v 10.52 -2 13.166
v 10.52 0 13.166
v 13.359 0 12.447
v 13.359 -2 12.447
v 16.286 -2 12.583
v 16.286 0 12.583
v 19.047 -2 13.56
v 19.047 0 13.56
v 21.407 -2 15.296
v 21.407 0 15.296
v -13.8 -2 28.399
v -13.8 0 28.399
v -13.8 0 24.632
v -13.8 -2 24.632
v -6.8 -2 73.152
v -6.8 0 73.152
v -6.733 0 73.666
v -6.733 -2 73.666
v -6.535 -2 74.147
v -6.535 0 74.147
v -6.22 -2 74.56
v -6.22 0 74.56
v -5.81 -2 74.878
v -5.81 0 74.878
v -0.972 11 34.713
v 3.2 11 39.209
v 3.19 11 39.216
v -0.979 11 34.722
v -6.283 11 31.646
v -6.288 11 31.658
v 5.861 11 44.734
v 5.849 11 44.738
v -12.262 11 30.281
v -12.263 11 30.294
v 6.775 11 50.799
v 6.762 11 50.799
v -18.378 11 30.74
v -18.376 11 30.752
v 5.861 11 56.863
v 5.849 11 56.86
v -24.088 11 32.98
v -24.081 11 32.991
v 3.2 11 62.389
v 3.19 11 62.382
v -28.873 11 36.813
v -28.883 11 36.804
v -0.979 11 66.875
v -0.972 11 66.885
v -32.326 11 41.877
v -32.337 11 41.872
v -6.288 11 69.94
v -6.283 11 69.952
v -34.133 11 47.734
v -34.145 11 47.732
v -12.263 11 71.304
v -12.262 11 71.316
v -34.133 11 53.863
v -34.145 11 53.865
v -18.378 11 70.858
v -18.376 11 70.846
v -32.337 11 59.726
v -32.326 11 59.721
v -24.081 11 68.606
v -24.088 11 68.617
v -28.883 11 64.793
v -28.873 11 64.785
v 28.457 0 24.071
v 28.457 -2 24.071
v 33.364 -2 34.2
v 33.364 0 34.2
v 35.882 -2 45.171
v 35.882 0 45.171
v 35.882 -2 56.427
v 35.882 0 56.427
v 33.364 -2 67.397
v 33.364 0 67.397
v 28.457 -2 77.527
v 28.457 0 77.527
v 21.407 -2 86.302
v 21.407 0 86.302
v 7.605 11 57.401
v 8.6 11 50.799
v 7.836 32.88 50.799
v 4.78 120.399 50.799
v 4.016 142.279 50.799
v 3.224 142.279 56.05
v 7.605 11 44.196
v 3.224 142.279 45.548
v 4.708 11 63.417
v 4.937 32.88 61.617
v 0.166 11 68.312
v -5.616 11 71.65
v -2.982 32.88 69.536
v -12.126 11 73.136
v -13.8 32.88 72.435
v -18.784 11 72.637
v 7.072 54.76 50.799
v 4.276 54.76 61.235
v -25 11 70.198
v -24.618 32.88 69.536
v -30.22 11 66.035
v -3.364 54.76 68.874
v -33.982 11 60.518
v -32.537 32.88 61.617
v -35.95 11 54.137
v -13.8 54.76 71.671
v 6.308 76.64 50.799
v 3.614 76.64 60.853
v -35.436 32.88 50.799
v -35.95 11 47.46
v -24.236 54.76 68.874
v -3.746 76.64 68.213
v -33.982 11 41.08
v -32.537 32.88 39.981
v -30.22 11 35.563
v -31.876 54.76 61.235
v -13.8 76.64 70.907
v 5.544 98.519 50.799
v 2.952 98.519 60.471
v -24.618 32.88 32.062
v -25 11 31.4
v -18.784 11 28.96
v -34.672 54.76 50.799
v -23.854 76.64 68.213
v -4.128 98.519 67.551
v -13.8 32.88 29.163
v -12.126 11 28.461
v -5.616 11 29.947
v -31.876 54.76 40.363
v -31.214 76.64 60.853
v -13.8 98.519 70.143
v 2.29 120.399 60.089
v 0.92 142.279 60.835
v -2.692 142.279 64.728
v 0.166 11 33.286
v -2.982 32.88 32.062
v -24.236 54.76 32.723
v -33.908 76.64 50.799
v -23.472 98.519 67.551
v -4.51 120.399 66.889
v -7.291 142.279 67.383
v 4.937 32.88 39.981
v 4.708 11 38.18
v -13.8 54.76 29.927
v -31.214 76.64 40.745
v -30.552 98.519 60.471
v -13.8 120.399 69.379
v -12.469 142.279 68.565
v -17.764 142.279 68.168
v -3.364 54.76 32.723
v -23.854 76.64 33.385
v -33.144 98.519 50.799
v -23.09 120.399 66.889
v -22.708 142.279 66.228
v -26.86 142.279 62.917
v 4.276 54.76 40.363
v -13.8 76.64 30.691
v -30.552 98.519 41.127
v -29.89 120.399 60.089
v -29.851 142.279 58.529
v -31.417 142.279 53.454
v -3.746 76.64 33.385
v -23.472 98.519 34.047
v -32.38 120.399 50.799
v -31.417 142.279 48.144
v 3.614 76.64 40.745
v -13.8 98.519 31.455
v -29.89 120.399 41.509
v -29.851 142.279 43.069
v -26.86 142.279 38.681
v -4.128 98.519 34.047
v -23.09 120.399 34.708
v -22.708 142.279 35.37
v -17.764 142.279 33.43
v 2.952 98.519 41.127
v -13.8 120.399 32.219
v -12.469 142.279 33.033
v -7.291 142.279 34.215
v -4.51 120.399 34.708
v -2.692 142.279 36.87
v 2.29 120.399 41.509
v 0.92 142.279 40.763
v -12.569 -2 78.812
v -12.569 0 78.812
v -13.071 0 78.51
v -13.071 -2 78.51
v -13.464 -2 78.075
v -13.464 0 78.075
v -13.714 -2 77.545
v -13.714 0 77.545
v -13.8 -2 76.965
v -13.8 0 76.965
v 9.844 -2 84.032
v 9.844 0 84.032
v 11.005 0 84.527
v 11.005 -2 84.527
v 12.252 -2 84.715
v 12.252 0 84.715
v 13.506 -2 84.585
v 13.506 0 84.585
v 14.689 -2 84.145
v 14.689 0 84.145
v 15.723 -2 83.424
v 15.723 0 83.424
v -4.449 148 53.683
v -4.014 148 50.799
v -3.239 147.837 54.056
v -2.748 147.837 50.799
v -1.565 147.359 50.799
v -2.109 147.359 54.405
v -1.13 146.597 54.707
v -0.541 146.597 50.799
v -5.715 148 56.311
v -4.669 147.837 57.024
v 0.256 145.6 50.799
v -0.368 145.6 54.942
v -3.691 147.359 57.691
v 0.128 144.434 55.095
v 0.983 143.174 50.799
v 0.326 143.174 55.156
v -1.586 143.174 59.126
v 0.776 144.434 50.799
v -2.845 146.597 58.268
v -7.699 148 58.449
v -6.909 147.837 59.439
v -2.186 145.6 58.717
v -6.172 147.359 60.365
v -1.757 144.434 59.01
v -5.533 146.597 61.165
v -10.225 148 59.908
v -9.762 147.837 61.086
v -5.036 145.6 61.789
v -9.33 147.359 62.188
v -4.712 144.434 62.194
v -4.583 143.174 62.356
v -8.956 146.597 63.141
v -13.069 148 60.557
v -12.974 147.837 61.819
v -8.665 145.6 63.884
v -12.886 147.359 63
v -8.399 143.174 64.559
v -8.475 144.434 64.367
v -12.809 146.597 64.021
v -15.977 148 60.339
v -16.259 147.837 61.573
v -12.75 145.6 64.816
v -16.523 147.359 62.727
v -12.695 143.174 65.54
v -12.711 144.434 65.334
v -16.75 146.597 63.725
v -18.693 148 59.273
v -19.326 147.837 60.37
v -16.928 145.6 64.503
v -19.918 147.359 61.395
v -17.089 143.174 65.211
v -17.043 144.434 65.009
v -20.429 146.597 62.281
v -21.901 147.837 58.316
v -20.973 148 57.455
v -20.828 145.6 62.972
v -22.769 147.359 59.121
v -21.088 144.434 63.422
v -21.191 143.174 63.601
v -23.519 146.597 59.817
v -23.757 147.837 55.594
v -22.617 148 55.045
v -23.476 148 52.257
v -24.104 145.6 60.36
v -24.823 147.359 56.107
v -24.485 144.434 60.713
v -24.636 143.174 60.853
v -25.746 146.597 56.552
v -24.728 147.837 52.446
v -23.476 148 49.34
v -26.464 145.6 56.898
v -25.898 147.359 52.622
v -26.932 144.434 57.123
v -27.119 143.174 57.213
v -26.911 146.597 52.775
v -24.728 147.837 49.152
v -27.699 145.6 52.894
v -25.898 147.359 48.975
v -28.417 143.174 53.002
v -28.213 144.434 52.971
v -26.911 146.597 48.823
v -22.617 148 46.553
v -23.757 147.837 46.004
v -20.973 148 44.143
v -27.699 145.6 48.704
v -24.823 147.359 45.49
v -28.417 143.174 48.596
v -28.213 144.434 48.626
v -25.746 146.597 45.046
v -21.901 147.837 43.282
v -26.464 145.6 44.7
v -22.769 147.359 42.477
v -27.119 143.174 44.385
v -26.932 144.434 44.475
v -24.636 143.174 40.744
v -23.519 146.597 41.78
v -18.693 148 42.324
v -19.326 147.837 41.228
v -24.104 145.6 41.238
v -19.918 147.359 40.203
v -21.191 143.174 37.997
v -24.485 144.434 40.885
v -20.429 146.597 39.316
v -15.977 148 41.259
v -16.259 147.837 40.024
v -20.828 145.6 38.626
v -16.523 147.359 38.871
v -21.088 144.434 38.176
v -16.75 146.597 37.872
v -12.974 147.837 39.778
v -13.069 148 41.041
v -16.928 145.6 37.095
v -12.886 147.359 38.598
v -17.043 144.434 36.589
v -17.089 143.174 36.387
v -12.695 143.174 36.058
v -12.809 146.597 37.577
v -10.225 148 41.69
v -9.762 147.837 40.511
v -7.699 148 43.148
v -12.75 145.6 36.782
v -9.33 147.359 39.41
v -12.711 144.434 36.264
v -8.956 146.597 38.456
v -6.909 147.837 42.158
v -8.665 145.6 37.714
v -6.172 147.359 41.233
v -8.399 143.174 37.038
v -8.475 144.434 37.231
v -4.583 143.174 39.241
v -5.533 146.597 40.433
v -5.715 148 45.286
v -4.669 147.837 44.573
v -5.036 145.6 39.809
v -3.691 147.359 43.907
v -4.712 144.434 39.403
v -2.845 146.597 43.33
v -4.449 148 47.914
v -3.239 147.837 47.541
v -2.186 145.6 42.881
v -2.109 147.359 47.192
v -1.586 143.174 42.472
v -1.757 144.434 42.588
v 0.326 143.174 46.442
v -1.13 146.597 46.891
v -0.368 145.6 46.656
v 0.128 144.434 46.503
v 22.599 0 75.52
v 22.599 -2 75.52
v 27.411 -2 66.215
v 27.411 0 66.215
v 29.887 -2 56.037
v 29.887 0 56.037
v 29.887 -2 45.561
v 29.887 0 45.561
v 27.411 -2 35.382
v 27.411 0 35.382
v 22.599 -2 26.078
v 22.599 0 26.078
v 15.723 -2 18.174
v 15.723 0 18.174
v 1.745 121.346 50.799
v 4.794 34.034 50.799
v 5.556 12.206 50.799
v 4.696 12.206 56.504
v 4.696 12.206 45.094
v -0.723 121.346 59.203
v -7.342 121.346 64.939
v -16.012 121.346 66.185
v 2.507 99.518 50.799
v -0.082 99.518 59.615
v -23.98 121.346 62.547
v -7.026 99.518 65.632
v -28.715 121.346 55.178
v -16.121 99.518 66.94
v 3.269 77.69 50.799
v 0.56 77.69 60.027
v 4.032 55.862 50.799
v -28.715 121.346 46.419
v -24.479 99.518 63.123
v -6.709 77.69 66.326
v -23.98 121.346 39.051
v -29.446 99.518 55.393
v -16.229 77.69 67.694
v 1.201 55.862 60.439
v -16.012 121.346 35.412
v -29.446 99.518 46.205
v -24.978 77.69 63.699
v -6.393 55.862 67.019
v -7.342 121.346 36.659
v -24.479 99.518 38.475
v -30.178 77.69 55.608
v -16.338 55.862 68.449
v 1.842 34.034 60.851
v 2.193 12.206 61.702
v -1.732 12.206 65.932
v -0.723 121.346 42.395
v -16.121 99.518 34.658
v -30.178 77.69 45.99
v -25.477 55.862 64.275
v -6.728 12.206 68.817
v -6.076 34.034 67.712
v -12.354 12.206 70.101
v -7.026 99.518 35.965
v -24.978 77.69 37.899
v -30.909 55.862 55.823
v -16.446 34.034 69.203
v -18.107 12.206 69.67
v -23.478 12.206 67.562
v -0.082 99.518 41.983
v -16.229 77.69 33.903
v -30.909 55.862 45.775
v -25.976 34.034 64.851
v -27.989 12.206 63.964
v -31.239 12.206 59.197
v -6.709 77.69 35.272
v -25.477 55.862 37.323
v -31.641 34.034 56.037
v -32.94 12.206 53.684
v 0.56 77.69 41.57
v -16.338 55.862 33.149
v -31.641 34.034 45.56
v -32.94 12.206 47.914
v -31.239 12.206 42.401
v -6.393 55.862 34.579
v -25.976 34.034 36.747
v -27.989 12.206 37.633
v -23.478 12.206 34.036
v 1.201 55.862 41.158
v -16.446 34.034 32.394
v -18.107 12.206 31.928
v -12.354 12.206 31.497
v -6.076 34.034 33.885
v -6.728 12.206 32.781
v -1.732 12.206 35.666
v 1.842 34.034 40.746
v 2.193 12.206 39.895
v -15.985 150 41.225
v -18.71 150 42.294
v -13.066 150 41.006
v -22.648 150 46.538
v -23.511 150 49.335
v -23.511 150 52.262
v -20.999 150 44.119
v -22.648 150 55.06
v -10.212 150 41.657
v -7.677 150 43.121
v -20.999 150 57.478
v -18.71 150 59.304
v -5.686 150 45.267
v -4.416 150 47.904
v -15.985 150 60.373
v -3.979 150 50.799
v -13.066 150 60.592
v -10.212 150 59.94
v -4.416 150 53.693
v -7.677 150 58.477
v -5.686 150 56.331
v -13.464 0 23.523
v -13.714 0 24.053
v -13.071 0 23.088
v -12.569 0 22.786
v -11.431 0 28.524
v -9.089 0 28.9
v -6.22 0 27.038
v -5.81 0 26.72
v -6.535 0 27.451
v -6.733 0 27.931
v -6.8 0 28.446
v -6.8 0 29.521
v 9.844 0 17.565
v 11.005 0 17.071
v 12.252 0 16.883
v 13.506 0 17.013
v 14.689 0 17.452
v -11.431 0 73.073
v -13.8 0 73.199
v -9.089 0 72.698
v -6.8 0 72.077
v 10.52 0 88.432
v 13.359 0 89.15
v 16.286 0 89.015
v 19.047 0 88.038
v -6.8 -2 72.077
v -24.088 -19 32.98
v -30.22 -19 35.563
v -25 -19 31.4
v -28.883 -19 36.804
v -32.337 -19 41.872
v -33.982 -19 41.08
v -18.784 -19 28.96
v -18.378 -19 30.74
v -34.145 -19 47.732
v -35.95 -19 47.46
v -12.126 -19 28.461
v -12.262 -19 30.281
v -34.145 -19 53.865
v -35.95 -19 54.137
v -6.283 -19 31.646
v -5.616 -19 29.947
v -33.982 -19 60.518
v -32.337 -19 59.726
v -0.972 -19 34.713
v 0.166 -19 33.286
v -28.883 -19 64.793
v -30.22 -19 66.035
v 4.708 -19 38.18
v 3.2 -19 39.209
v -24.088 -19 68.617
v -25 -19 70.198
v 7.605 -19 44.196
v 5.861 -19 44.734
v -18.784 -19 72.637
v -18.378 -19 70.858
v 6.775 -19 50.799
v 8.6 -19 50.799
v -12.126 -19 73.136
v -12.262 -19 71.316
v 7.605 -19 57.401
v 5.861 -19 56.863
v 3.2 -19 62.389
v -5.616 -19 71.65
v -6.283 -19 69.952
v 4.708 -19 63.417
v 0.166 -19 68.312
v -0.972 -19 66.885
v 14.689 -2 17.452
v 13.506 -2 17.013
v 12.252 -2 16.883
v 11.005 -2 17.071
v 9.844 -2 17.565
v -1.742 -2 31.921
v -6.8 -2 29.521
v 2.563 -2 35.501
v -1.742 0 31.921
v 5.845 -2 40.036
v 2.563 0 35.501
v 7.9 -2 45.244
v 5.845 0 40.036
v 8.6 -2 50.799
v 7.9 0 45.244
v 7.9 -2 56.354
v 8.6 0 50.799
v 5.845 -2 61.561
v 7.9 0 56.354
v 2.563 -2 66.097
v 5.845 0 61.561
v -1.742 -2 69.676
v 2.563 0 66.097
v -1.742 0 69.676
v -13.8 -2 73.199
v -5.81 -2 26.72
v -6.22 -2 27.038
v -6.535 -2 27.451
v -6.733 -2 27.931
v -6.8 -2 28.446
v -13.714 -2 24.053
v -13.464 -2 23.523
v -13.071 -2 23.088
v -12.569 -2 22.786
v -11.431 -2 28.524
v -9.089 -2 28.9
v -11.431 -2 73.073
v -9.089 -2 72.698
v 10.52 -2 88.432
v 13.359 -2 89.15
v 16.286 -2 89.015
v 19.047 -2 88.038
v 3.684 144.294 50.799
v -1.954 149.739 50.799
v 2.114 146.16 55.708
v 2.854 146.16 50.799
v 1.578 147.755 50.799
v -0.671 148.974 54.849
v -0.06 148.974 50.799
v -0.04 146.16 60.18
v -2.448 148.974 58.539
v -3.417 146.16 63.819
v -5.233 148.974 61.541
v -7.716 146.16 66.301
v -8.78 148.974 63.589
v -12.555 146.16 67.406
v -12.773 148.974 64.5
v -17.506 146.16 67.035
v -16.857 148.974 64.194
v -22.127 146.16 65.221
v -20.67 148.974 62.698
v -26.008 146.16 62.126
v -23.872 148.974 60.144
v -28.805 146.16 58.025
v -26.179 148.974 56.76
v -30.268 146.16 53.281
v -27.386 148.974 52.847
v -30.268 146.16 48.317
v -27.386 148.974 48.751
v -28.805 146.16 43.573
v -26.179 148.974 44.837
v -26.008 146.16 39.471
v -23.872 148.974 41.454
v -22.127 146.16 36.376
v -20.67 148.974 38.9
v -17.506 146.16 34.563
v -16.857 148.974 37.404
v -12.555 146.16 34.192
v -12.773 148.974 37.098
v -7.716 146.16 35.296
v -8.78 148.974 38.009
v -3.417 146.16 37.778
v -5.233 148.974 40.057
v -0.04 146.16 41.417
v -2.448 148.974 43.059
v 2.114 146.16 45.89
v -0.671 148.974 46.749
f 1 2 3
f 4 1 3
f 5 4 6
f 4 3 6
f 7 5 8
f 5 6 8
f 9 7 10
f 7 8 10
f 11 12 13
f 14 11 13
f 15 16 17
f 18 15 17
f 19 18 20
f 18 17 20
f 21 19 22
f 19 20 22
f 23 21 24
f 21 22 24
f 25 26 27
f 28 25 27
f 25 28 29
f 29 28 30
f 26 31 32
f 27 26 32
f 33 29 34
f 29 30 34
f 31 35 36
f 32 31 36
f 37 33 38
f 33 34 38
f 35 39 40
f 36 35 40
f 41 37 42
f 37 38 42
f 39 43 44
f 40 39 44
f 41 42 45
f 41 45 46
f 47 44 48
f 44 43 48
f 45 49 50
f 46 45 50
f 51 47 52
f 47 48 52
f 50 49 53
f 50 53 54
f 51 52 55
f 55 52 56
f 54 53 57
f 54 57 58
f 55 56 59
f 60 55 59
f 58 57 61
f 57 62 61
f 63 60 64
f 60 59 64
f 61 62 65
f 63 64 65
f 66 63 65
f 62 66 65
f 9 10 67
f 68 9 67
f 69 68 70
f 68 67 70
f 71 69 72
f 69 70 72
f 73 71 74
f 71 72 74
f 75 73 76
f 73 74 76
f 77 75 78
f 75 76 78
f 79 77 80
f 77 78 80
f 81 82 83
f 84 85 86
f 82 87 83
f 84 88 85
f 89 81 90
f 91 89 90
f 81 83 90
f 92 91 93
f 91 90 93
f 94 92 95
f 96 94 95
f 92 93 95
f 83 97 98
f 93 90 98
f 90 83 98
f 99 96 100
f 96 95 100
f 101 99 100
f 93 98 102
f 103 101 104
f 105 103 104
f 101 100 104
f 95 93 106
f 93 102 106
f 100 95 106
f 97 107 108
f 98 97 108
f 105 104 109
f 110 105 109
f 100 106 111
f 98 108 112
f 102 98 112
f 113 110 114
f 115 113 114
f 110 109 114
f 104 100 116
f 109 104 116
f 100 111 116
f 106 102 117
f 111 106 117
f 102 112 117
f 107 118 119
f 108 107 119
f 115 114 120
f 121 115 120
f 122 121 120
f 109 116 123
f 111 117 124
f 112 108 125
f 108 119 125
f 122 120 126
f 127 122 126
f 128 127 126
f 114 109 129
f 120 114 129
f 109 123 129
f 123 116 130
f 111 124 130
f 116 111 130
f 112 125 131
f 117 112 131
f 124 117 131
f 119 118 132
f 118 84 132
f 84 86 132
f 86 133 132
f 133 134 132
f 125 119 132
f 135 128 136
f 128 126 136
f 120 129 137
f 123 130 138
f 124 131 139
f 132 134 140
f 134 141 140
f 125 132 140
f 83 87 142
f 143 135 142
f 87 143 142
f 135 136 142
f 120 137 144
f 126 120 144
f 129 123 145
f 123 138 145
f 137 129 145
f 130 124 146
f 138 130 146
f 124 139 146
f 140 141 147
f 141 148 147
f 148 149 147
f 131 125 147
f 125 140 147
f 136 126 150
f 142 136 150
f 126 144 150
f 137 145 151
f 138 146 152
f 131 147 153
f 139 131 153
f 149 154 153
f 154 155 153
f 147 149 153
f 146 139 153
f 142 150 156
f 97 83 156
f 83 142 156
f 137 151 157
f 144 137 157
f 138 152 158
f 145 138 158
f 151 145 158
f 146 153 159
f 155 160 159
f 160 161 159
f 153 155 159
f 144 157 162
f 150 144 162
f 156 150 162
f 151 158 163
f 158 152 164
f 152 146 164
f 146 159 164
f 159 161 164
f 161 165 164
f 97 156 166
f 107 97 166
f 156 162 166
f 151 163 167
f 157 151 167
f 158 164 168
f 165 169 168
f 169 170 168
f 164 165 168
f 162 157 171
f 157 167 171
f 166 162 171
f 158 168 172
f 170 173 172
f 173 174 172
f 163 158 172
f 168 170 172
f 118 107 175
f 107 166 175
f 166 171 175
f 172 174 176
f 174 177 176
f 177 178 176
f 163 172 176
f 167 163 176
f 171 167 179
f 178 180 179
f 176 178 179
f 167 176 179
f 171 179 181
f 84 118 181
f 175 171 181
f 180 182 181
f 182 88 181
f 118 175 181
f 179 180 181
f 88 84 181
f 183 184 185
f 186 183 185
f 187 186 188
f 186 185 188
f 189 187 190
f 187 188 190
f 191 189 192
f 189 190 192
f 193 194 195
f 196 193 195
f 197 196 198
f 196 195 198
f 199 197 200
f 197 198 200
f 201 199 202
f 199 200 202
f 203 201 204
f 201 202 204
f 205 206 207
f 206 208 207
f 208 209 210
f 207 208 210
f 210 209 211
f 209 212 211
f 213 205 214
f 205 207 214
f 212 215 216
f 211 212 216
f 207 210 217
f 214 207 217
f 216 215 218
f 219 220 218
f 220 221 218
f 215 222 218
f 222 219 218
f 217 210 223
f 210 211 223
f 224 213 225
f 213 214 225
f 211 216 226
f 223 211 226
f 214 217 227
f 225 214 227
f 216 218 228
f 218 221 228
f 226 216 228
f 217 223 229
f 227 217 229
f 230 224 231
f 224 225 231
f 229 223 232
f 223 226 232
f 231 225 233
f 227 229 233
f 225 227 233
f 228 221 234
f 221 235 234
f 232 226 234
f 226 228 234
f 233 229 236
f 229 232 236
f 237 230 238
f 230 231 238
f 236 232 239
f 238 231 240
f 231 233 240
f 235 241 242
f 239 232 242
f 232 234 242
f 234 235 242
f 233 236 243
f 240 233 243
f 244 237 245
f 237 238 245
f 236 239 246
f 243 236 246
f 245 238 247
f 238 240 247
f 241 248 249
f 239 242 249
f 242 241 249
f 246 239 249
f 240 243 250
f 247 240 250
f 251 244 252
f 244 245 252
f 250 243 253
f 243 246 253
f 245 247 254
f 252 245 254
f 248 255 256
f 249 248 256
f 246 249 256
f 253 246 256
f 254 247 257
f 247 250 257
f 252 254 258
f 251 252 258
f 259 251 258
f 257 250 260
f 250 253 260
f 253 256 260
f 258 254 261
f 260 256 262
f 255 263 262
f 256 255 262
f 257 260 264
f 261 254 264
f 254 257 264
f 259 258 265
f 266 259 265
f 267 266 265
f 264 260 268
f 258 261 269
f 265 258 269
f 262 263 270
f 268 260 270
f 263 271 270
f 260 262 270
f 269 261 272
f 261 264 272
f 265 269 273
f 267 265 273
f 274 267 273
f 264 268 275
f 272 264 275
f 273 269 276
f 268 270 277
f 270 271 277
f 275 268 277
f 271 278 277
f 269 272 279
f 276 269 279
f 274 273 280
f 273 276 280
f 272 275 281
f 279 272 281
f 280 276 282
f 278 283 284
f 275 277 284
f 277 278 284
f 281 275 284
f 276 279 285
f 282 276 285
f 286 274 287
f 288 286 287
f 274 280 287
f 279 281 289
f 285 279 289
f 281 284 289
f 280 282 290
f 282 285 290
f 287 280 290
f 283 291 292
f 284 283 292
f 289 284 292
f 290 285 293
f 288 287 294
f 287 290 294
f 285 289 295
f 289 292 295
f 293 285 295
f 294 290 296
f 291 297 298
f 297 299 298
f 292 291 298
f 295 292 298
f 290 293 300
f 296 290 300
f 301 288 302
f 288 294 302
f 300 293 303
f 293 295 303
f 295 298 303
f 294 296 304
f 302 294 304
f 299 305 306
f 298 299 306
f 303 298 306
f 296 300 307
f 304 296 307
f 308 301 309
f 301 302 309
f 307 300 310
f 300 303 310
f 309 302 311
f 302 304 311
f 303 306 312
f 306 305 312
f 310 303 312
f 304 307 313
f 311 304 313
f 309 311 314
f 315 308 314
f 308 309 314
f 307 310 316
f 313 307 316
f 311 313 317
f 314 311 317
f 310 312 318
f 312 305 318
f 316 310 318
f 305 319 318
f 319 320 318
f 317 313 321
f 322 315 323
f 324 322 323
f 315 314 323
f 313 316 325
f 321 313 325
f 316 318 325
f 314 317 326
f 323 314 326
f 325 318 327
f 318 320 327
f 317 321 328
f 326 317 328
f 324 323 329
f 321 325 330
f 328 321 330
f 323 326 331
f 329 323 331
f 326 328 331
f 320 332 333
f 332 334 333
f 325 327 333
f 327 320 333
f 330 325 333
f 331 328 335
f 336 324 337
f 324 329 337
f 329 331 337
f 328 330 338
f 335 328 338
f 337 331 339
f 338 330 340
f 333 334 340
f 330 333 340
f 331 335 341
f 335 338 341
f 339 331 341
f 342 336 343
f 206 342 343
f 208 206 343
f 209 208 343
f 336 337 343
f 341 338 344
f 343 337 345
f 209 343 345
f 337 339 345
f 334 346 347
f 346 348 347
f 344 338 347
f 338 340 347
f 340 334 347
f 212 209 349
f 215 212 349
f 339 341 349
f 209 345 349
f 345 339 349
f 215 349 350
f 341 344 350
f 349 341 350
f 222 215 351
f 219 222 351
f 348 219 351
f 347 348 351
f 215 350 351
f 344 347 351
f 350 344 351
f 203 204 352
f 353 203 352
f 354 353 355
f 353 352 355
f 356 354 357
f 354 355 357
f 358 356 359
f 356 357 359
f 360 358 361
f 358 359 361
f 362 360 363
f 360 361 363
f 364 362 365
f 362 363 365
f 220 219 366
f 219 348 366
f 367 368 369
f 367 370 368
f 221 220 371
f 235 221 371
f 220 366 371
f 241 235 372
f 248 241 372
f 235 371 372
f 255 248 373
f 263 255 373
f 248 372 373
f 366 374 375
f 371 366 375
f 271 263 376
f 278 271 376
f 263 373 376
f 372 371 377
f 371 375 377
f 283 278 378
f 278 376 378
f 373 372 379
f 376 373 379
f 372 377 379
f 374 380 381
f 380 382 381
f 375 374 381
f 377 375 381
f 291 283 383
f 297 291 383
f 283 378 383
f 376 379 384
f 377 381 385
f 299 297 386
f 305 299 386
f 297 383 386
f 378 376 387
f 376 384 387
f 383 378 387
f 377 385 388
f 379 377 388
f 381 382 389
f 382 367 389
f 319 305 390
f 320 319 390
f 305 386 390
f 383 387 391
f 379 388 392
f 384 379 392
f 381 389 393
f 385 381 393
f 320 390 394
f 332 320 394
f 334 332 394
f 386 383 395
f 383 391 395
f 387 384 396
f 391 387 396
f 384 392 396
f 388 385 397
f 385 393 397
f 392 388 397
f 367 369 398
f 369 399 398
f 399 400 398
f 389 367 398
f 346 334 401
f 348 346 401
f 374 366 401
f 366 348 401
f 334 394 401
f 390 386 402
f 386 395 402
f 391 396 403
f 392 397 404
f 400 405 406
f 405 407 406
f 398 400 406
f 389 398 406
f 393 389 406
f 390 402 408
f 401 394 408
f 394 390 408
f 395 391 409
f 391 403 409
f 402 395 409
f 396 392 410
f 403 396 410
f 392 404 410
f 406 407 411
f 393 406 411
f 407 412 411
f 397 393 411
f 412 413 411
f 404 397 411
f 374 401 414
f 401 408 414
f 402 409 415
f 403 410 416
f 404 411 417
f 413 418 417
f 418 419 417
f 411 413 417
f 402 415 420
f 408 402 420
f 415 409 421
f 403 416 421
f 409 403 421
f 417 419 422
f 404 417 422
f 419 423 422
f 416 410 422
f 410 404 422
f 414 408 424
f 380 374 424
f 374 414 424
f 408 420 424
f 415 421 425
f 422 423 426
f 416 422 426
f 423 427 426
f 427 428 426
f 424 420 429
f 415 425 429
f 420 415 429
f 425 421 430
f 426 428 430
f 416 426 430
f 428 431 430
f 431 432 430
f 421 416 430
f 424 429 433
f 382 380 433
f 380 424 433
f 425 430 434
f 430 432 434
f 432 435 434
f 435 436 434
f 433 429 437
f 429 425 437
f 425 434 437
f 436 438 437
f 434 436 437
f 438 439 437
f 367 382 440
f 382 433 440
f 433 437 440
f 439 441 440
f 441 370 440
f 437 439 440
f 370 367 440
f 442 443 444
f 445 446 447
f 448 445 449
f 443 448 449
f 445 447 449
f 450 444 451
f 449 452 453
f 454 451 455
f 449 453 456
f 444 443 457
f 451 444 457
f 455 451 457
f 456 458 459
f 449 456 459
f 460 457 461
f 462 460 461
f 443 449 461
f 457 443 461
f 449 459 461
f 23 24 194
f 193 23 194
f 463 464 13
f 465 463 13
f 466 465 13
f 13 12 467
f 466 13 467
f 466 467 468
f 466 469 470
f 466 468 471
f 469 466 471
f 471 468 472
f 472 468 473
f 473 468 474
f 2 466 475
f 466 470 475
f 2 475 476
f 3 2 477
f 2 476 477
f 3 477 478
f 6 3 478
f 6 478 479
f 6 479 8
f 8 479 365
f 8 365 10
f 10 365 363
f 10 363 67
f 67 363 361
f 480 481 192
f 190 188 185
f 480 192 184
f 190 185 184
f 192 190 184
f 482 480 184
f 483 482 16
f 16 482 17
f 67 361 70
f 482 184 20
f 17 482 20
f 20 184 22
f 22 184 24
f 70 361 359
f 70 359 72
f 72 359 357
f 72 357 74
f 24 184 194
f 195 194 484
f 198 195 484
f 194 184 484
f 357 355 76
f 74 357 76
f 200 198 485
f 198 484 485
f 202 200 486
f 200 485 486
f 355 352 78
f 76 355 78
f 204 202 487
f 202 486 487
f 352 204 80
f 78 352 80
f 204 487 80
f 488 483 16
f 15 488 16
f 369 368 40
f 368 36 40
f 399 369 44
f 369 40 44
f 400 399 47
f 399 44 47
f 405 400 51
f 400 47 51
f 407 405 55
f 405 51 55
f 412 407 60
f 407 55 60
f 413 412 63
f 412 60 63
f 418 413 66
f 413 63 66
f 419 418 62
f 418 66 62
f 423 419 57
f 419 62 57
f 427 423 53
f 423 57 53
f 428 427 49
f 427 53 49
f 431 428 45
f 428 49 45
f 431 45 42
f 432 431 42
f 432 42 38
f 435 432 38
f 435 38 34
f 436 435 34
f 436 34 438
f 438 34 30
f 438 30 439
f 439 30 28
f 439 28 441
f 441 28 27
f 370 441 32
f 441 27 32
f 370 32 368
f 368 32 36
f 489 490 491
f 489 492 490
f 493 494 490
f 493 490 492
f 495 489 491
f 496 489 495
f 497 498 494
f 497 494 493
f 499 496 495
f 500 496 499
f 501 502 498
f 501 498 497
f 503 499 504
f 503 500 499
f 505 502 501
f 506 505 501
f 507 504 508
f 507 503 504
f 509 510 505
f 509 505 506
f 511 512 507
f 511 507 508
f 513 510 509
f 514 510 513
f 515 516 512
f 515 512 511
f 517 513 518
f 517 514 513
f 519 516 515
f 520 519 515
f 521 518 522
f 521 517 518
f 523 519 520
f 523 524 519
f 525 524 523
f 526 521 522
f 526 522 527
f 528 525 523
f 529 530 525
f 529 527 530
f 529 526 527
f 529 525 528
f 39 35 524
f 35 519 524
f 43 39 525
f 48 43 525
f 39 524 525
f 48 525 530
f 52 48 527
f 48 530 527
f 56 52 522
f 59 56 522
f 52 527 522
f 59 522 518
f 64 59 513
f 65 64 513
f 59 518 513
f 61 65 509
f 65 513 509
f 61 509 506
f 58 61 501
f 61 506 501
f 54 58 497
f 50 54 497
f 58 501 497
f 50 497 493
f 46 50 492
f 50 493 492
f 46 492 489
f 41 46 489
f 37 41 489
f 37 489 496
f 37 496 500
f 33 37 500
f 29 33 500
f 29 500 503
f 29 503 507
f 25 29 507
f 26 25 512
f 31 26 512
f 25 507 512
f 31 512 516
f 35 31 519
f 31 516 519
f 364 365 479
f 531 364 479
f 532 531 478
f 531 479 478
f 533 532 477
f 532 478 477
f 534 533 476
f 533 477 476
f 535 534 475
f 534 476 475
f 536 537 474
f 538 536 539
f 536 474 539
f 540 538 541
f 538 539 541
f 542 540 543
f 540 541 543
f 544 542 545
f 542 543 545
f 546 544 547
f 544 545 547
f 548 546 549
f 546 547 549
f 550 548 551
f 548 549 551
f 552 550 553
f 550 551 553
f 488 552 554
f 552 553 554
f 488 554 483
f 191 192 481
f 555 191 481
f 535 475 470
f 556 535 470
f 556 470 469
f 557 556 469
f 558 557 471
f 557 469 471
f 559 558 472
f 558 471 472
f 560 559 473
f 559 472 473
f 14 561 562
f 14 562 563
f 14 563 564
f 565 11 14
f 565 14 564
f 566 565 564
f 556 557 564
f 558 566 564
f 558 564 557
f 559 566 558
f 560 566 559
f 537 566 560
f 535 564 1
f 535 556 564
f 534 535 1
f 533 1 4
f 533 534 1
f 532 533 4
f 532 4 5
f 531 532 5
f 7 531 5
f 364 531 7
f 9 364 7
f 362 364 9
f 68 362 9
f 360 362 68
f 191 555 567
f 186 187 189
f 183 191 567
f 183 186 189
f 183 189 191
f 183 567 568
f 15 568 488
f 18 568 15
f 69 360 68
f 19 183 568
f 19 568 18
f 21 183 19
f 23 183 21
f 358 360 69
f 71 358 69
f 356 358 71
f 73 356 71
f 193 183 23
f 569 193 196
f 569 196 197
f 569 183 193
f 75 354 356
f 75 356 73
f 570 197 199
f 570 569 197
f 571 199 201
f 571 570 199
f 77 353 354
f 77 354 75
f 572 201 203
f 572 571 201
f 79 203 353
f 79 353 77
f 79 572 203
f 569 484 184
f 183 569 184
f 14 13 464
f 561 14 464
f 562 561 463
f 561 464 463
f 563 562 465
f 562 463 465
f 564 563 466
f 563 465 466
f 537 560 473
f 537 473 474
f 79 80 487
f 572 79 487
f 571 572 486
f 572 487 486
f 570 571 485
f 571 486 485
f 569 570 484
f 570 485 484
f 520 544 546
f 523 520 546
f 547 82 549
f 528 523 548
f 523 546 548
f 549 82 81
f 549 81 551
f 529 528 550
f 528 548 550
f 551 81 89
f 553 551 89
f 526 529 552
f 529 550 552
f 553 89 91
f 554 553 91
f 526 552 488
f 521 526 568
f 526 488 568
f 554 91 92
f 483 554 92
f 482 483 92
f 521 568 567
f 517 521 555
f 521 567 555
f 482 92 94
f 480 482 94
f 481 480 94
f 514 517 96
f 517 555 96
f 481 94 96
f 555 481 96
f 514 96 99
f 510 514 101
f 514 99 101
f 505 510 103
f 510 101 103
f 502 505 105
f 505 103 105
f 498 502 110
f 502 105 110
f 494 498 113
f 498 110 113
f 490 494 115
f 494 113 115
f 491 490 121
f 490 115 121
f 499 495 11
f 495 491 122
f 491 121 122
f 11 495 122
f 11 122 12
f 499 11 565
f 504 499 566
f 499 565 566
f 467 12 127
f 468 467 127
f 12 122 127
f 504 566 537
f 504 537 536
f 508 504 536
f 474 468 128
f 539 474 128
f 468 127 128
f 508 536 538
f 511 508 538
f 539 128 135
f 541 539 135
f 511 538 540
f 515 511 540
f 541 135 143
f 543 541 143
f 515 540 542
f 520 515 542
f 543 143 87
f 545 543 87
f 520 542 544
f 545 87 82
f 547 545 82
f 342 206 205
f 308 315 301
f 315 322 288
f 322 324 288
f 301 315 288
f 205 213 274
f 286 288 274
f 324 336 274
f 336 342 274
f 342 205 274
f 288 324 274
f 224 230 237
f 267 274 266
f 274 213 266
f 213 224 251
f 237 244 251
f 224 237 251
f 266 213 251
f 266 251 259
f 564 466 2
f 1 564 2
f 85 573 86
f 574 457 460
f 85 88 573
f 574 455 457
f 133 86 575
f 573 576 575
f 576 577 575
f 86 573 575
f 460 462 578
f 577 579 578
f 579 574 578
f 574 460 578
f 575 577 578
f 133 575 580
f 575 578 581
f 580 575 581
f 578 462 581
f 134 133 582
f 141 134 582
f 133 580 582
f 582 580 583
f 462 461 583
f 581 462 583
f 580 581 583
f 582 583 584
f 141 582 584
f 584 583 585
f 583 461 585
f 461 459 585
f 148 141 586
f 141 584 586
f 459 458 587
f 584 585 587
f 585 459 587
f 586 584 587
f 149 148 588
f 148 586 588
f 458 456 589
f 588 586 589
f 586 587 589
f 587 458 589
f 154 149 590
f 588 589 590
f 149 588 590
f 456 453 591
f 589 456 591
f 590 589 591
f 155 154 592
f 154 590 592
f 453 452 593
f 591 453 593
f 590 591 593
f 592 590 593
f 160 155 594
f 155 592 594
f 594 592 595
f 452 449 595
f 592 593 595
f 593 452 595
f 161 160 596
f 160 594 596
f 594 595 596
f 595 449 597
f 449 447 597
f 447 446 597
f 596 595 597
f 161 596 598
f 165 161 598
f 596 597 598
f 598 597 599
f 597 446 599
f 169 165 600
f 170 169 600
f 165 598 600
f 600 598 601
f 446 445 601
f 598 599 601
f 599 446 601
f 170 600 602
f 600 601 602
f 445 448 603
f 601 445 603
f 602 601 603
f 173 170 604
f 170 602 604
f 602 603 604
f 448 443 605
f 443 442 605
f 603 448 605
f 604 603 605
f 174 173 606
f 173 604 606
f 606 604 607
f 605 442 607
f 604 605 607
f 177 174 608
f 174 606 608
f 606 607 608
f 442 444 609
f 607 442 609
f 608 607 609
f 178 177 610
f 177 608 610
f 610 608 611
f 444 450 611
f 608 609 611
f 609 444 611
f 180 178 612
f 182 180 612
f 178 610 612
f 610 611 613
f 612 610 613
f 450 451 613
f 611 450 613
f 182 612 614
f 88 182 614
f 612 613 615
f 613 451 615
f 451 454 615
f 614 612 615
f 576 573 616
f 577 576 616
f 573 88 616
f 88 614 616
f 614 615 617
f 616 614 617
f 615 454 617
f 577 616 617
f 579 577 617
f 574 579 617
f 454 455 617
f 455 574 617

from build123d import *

# Parameters (mm, degrees)
F2_R     = 20.575
F3_DEPTH = 2
F4_R     = 22.4
F4_R_2   = 20.575
F5_DEPTH = 17
F6_DEPTH = 30


# Not quite as in the source:
# - ends of sketch curves that miss each other by under 0.0002 mm in the source are joined


with BuildPart() as f3:
    # F2 (on Front) → F3 (new body)
    with BuildSketch(Plane.XZ):
        with BuildLine():
            Line((-13.8, 76.965483), (-13.8, 73.198817))
            ThreePointArc((-13.8, 73.198817), (-36.2, 50.798817), (-13.8, 28.398817))
            Line((-13.8, 28.398817), (-13.8, 24.63215))
            ThreePointArc((-13.8, 24.63215), (-13.464101, 23.52275), (-12.569231, 22.785996))
            Line((-12.569231, 22.785996), (10.519527, 13.16568))
            ThreePointArc((10.519527, 13.16568), (16.285797, 12.582523), (21.407101, 15.295858))
            ThreePointArc((21.407101, 15.295858), (36.2, 50.798817), (21.407101, 86.301775))
            ThreePointArc((21.407101, 86.301775), (16.285797, 89.01511), (10.519527, 88.431952))
            Line((10.519527, 88.431952), (-12.569231, 78.811637))
            ThreePointArc((-12.569231, 78.811637), (-13.464101, 78.074883), (-13.8, 76.965483))
        make_face()
        with Locations((-13.8, 50.798817)):
            Circle(F2_R, mode=Mode.SUBTRACT)
        with BuildLine():
            ThreePointArc((-6.8, 29.520659), (8.6, 50.798817), (-6.8, 72.076975))
            Line((-6.8, 72.076975), (-6.8, 73.151537))
            ThreePointArc((-6.8, 73.151537), (-6.534832, 74.146705), (-5.809641, 74.877986))
            Line((-5.809641, 74.877986), (9.844156, 84.032447))
            ThreePointArc((9.844156, 84.032447), (12.883236, 84.689734), (15.723162, 83.423698))
            ThreePointArc((15.723162, 83.423698), (30.2, 50.798817), (15.723162, 18.173935))
            ThreePointArc((15.723162, 18.173935), (12.883236, 16.907899), (9.844156, 17.565186))
            Line((9.844156, 17.565186), (-5.809641, 26.719647))
            ThreePointArc((-5.809641, 26.719647), (-6.534832, 27.450928), (-6.8, 28.446096))
            Line((-6.8, 28.446096), (-6.8, 29.520659))
        make_face(mode=Mode.SUBTRACT)
    extrude(amount=F3_DEPTH)

    # F4 (on face) → F5 (join)
    with BuildSketch(Plane.XZ.offset(2)):
        with Locations((-13.8, 50.798817)):
            Circle(F4_R)
        with Locations((-13.8, 50.798817)):
            Circle(F4_R_2, mode=Mode.SUBTRACT)
    extrude(amount=F5_DEPTH)

    # F6 (add): a face of the model
    f6_faces = [f3.faces().sort_by_distance(p)[0] for p in [
        (-35.566432, -19, 50.798817),
    ]]
    extrude(f6_faces, amount=-F6_DEPTH)

    # F7 (on plane+point) → F8 (revolve)
    with BuildSketch(Plane.XY.offset(50.798817)):
        with BuildLine():
            Line((6.7625, 11), (8.6, 11))
            Line((8.6, 11), (4.015629, 142.279196))
            ThreePointArc((4.015629, 142.279196), (1.57777, 147.754718), (-3.979497, 150))
            Line((-3.979497, 150), (-13.8, 150))
            Line((-13.8, 150), (-13.8, 148))
            Line((-13.8, 148), (-4.014418, 148))
            ThreePointArc((-4.014418, 148), (-0.541126, 146.596699), (0.982536, 143.174497))
            Line((0.982536, 143.174497), (5.556041, 12.206459))
            Line((5.556041, 12.206459), (6.7625, 11))
        make_face()
    revolve(axis=Axis((-13.8, 149, 50.798817), (0, -1, 0)))


solid = f3.part
